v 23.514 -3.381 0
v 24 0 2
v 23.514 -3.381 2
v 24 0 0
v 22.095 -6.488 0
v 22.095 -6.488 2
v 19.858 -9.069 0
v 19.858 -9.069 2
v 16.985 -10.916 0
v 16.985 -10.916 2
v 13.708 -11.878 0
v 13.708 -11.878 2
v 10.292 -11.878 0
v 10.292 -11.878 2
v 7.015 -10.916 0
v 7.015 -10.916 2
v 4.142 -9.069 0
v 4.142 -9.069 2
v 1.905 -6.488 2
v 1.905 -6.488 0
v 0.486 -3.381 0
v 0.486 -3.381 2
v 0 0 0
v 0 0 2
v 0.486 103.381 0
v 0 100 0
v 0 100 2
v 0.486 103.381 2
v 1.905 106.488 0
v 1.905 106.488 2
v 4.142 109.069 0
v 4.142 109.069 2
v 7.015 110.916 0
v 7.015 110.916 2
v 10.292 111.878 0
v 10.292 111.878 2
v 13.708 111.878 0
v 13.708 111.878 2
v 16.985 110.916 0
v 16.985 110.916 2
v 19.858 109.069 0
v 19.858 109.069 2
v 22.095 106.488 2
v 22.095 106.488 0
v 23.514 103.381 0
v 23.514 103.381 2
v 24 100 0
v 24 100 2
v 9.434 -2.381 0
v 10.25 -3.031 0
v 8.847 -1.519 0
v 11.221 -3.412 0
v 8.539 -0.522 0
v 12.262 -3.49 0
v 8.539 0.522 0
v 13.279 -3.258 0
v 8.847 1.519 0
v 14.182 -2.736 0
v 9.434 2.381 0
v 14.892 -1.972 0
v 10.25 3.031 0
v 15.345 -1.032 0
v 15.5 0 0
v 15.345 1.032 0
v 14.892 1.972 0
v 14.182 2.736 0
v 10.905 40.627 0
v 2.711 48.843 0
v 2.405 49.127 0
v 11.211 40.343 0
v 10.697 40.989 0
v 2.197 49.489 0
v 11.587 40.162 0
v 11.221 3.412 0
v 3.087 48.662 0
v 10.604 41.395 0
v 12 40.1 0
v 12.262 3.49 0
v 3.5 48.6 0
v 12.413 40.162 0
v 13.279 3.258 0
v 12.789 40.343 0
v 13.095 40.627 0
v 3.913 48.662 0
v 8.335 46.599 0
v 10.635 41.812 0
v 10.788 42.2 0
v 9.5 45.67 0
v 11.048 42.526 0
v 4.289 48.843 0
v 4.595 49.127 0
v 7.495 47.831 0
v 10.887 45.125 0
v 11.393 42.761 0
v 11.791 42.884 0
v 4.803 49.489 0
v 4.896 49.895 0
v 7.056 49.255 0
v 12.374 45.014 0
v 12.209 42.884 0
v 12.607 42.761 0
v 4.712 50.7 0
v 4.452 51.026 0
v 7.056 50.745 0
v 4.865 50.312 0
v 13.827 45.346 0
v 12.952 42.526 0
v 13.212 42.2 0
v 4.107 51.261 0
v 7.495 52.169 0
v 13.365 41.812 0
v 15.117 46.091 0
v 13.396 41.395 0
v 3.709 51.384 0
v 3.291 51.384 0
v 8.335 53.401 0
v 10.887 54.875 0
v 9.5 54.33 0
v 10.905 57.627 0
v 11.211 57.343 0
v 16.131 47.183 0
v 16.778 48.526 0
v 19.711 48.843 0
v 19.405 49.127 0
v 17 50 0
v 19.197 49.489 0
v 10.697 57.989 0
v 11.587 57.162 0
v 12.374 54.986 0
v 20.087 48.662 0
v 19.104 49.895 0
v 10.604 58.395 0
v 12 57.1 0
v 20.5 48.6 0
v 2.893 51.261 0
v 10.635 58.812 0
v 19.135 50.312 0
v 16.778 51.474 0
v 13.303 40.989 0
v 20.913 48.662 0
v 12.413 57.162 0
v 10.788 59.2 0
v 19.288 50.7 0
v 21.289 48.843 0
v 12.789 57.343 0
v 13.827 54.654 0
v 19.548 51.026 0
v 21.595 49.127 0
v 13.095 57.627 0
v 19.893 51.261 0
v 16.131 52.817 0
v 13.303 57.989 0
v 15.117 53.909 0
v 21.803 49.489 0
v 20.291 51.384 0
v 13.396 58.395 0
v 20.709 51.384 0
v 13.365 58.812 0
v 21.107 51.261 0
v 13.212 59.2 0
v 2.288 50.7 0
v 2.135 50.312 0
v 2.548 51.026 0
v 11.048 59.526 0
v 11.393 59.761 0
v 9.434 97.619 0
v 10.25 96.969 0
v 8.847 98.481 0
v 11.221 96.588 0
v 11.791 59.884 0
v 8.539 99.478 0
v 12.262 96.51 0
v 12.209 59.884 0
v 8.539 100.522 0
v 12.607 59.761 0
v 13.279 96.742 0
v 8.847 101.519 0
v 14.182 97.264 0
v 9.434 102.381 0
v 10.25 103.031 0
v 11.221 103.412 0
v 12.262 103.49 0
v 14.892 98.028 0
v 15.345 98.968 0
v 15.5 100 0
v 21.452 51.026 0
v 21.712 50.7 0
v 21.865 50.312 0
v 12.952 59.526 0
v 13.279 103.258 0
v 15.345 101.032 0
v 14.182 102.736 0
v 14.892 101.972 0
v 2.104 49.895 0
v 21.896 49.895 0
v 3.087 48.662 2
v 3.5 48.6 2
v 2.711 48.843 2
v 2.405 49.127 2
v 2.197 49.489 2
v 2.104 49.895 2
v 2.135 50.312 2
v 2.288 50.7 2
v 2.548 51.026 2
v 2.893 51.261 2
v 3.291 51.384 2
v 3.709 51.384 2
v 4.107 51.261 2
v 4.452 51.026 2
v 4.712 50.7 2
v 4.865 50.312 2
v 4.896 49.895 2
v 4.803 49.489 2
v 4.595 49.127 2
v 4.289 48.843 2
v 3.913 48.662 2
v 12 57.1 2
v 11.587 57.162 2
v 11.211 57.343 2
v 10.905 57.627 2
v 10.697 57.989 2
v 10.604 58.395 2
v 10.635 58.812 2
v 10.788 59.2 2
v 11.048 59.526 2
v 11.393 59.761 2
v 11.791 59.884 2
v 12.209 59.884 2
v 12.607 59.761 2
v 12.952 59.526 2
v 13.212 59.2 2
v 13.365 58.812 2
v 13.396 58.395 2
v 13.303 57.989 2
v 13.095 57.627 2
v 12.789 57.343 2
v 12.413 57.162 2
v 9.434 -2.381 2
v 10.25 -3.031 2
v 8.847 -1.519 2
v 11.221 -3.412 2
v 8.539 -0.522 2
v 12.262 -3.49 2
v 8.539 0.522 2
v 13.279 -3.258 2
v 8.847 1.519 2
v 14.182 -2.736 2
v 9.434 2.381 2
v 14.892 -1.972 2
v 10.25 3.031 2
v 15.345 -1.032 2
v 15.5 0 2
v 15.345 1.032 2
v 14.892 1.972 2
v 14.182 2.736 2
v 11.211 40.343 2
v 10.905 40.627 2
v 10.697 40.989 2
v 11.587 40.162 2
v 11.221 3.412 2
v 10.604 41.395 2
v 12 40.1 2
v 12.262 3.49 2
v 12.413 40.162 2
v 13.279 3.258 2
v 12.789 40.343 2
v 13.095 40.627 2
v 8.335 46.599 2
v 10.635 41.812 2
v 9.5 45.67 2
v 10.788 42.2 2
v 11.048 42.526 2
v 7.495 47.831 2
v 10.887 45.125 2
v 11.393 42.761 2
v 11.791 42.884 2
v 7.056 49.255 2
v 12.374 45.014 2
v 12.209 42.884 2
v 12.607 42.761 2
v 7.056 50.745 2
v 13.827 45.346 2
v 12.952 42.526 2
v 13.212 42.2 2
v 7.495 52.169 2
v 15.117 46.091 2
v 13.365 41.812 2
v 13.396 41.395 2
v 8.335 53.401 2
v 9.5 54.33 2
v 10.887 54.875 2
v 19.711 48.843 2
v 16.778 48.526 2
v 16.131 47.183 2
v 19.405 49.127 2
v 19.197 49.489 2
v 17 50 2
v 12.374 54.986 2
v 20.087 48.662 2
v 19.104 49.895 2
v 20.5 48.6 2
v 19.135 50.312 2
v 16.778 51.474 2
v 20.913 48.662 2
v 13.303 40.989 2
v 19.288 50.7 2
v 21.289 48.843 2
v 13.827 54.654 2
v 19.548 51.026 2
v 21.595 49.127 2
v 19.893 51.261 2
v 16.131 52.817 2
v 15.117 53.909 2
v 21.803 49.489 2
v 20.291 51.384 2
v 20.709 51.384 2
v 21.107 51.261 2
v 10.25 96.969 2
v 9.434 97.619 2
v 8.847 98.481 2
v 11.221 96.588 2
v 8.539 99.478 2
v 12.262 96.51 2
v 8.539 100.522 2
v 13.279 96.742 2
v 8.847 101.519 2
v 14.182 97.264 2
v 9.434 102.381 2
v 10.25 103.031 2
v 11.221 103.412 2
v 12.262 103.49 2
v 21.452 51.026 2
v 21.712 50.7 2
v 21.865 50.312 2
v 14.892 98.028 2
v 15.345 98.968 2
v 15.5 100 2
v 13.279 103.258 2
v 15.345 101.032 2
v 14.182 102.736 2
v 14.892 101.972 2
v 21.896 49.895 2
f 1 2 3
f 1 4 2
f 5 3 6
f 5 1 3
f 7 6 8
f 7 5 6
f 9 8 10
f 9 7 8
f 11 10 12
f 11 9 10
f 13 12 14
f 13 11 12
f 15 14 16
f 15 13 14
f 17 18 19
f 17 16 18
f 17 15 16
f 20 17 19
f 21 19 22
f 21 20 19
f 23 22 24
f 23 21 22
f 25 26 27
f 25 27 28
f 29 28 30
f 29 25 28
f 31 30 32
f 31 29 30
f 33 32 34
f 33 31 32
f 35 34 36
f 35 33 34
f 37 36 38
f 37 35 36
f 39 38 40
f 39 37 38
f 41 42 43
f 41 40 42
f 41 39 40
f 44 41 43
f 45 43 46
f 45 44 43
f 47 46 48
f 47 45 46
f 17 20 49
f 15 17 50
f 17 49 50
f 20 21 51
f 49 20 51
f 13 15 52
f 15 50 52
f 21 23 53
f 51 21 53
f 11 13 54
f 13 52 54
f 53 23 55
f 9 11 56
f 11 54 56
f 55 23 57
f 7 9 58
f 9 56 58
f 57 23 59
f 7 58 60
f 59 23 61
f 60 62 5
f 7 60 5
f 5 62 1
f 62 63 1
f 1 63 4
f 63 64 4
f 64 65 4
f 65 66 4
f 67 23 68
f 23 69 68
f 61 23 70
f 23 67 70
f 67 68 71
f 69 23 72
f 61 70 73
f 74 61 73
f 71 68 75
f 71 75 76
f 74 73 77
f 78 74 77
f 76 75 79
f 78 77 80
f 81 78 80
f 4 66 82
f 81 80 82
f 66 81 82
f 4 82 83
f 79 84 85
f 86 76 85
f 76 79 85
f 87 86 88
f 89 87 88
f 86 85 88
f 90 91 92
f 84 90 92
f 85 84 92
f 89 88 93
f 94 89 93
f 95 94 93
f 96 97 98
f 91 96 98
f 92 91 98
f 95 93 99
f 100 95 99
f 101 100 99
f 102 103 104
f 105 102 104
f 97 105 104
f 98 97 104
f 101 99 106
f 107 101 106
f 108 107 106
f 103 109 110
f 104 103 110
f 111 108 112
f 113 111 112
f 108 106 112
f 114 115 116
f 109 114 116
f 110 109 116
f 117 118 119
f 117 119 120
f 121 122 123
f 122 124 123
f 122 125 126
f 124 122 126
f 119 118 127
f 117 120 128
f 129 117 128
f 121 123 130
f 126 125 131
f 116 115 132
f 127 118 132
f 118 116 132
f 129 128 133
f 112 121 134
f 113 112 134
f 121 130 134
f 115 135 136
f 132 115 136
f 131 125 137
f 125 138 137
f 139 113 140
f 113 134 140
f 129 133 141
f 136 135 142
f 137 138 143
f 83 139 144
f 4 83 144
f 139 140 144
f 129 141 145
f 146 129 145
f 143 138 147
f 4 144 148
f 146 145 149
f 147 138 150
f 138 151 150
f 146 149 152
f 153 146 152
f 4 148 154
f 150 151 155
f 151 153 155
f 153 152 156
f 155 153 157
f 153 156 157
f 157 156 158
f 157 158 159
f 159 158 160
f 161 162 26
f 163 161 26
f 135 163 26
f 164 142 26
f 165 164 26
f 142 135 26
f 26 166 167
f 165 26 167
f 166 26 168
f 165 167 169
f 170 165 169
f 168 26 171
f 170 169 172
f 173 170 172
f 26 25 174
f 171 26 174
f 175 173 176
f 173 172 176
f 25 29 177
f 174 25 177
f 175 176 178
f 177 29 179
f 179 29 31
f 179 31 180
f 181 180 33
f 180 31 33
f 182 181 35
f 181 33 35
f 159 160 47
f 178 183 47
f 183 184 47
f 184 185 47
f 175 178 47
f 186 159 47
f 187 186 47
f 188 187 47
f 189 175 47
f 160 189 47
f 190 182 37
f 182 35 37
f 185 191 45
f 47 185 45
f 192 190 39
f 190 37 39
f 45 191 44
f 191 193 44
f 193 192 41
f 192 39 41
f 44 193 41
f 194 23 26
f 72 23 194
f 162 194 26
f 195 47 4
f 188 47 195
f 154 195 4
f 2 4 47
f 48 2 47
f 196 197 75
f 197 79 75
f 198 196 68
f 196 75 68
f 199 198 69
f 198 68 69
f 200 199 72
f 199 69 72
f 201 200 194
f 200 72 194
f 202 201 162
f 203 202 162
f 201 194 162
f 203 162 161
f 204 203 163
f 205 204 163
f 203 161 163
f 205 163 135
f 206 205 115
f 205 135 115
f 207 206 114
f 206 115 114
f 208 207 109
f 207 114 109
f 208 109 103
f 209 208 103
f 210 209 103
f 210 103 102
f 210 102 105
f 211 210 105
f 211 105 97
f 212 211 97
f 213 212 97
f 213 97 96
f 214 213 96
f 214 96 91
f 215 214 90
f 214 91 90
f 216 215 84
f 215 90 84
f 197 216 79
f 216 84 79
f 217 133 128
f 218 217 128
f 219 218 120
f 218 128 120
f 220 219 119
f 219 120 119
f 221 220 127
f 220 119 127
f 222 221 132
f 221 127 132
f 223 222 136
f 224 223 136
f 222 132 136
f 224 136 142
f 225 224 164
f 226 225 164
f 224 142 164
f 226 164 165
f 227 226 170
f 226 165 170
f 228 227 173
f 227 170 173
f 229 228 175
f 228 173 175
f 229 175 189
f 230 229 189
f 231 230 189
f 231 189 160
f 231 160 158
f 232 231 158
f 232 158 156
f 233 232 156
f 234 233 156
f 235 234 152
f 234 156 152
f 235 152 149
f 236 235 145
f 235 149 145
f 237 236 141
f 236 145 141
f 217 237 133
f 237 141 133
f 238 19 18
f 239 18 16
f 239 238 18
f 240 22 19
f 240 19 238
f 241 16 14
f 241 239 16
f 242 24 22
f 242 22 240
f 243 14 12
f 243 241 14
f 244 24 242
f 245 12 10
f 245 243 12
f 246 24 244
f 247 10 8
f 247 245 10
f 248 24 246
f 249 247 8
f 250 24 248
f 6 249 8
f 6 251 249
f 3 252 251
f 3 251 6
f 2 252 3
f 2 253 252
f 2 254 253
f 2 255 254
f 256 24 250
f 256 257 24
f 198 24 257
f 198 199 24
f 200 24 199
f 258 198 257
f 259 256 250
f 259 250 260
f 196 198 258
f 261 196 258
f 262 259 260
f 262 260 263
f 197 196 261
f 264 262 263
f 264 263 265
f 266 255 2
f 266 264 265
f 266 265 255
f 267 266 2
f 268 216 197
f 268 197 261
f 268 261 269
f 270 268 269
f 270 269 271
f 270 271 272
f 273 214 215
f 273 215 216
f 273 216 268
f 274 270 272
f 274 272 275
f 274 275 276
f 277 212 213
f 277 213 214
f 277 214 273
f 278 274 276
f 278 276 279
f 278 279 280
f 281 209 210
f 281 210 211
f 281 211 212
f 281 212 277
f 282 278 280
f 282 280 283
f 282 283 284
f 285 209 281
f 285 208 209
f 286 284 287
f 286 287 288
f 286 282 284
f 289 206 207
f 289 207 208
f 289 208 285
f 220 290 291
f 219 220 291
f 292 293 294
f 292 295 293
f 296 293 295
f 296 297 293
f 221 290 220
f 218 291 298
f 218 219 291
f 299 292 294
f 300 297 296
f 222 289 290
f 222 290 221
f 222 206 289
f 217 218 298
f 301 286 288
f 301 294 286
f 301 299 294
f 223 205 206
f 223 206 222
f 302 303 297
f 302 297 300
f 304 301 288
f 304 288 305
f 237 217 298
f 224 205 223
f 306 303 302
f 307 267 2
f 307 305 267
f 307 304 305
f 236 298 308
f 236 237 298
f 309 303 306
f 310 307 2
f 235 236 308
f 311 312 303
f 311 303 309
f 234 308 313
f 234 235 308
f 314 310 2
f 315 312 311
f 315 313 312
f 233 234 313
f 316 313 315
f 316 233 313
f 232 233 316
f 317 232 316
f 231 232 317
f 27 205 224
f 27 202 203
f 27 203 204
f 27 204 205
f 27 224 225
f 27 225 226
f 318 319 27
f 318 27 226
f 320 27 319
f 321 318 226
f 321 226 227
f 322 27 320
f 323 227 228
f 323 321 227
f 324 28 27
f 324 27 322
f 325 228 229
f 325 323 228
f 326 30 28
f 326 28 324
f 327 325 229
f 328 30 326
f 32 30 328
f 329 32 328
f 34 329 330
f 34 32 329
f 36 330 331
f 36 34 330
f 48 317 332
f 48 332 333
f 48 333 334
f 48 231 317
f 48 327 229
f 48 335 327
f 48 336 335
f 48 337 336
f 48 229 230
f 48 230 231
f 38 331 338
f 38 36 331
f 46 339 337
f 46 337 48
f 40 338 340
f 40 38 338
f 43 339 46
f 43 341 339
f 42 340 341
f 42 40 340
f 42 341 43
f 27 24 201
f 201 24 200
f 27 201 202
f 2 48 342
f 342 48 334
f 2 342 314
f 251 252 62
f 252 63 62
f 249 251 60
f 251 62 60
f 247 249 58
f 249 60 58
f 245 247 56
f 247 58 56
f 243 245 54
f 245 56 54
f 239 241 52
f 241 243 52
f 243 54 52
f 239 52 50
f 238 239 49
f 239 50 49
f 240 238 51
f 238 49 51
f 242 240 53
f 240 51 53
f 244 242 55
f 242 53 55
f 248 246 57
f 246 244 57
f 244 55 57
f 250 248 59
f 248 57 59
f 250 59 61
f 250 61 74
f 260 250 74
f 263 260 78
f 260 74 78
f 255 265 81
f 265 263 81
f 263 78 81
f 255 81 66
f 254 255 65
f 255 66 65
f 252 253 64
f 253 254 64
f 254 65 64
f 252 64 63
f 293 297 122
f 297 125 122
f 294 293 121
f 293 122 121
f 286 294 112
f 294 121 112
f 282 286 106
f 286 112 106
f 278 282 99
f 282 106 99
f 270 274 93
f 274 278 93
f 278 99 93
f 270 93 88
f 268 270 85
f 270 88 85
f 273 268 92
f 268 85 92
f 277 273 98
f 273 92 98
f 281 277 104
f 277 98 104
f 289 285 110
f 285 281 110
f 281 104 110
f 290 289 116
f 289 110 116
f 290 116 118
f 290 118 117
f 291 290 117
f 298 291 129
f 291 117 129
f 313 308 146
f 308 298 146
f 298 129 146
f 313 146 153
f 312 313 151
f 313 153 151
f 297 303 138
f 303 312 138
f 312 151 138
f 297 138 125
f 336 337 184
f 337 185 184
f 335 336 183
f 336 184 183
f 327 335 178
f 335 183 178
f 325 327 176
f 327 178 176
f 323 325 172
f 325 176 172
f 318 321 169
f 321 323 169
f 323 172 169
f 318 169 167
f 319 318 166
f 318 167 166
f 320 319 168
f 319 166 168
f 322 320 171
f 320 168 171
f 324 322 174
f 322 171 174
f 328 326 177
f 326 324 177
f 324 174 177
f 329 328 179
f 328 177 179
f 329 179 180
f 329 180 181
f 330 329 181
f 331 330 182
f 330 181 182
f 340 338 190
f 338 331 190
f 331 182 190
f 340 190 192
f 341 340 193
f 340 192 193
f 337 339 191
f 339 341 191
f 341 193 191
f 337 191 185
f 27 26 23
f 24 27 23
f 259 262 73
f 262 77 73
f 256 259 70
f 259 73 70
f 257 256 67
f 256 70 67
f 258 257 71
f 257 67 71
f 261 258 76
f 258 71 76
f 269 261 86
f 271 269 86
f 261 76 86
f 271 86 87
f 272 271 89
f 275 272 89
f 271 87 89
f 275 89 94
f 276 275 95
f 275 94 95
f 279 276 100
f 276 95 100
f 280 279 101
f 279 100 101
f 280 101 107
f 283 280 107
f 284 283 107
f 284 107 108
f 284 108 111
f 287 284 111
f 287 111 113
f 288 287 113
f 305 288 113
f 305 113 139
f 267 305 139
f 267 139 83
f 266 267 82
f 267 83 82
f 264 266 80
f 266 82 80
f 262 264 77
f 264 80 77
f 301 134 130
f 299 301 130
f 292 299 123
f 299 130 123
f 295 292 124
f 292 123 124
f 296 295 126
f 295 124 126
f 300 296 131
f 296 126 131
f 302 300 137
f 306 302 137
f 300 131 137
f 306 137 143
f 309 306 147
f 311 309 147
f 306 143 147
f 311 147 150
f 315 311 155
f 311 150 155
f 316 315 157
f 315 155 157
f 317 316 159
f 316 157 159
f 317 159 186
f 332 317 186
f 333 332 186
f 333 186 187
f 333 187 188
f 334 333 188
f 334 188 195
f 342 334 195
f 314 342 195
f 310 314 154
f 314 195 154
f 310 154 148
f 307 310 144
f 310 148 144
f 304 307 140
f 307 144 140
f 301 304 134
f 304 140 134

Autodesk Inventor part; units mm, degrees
ref_plane "YZ Plane" through (0, 0, 0) normal (1, 0, 0) x (0, 1, 0)
ref_plane "XZ Plane" through (0, 0, 0) normal (0, 1, 0) x (-1, 0, 0)
ref_plane "XY Plane" through (0, 0, 0) normal (0, 0, 1) x (1, 0, 0)
sketch "スケッチ1" plane through (0, 0, 0) normal (0, 0, 1) x (1, 0, 0)
  line L0 (24, 0) -> (24, 100)
  line L1 (0, 100) -> (0, 0)
  line L2 (12, 100) -> (12, 0) construction
  arc A0 (24, 100) -> (0, 100) centre (12, 100) ccw
  arc A1 (0, 0) -> (24, 0) centre (12, 0) ccw
  circle A2 centre (12, 0) radius 3.5
  circle A3 centre (12, 100) radius 3.5
  circle A4 centre (12, 50) radius 5
  dimension "d35" = 24
  dimension "d36" = 100
  dimension "d37" = 7
  dimension "d38" = 7
  dimension "d41" = 10
extrude "押し出し1" add sketch "スケッチ1" along normal blind 2
sketch "スケッチ3" plane through (0, 0, 2) normal (0, 0, 1) x (1, 0, 0)
  circle A0 centre (12, 0) radius 3.5 projected
  circle A1 centre (12, 100) radius 3.5 projected
  circle A2 centre (12, 50) radius 5 projected
  arc A3 (24, 100) -> (0, 100) centre (12, 100) ccw projected
  line L0 (0, 100) -> (0, 0) projected
  arc A4 (0, 0) -> (24, 0) centre (12, 0) ccw projected
  line L1 (24, 0) -> (24, 100) projected
  line L2 (12, 50) -> (24, 50) construction
  line L3 (24, 0) -> (24, 100) projected
  point P0 (20.5, 50)
  point P1 (12, 58.5)
  point P2 (3.5, 50)
  point P3 (12, 41.5)
  dimension "d42" = 8.5
  dimension "d45" = 360
hole "穴1" at (20.5, 50, 2) at (12, 58.5, 2) at (3.5, 50, 2) at (12, 41.5, 2) direction (0, 0, -1) diameter 2.8 end through all
properties part number "hip_link_motor" material "GFRP"
